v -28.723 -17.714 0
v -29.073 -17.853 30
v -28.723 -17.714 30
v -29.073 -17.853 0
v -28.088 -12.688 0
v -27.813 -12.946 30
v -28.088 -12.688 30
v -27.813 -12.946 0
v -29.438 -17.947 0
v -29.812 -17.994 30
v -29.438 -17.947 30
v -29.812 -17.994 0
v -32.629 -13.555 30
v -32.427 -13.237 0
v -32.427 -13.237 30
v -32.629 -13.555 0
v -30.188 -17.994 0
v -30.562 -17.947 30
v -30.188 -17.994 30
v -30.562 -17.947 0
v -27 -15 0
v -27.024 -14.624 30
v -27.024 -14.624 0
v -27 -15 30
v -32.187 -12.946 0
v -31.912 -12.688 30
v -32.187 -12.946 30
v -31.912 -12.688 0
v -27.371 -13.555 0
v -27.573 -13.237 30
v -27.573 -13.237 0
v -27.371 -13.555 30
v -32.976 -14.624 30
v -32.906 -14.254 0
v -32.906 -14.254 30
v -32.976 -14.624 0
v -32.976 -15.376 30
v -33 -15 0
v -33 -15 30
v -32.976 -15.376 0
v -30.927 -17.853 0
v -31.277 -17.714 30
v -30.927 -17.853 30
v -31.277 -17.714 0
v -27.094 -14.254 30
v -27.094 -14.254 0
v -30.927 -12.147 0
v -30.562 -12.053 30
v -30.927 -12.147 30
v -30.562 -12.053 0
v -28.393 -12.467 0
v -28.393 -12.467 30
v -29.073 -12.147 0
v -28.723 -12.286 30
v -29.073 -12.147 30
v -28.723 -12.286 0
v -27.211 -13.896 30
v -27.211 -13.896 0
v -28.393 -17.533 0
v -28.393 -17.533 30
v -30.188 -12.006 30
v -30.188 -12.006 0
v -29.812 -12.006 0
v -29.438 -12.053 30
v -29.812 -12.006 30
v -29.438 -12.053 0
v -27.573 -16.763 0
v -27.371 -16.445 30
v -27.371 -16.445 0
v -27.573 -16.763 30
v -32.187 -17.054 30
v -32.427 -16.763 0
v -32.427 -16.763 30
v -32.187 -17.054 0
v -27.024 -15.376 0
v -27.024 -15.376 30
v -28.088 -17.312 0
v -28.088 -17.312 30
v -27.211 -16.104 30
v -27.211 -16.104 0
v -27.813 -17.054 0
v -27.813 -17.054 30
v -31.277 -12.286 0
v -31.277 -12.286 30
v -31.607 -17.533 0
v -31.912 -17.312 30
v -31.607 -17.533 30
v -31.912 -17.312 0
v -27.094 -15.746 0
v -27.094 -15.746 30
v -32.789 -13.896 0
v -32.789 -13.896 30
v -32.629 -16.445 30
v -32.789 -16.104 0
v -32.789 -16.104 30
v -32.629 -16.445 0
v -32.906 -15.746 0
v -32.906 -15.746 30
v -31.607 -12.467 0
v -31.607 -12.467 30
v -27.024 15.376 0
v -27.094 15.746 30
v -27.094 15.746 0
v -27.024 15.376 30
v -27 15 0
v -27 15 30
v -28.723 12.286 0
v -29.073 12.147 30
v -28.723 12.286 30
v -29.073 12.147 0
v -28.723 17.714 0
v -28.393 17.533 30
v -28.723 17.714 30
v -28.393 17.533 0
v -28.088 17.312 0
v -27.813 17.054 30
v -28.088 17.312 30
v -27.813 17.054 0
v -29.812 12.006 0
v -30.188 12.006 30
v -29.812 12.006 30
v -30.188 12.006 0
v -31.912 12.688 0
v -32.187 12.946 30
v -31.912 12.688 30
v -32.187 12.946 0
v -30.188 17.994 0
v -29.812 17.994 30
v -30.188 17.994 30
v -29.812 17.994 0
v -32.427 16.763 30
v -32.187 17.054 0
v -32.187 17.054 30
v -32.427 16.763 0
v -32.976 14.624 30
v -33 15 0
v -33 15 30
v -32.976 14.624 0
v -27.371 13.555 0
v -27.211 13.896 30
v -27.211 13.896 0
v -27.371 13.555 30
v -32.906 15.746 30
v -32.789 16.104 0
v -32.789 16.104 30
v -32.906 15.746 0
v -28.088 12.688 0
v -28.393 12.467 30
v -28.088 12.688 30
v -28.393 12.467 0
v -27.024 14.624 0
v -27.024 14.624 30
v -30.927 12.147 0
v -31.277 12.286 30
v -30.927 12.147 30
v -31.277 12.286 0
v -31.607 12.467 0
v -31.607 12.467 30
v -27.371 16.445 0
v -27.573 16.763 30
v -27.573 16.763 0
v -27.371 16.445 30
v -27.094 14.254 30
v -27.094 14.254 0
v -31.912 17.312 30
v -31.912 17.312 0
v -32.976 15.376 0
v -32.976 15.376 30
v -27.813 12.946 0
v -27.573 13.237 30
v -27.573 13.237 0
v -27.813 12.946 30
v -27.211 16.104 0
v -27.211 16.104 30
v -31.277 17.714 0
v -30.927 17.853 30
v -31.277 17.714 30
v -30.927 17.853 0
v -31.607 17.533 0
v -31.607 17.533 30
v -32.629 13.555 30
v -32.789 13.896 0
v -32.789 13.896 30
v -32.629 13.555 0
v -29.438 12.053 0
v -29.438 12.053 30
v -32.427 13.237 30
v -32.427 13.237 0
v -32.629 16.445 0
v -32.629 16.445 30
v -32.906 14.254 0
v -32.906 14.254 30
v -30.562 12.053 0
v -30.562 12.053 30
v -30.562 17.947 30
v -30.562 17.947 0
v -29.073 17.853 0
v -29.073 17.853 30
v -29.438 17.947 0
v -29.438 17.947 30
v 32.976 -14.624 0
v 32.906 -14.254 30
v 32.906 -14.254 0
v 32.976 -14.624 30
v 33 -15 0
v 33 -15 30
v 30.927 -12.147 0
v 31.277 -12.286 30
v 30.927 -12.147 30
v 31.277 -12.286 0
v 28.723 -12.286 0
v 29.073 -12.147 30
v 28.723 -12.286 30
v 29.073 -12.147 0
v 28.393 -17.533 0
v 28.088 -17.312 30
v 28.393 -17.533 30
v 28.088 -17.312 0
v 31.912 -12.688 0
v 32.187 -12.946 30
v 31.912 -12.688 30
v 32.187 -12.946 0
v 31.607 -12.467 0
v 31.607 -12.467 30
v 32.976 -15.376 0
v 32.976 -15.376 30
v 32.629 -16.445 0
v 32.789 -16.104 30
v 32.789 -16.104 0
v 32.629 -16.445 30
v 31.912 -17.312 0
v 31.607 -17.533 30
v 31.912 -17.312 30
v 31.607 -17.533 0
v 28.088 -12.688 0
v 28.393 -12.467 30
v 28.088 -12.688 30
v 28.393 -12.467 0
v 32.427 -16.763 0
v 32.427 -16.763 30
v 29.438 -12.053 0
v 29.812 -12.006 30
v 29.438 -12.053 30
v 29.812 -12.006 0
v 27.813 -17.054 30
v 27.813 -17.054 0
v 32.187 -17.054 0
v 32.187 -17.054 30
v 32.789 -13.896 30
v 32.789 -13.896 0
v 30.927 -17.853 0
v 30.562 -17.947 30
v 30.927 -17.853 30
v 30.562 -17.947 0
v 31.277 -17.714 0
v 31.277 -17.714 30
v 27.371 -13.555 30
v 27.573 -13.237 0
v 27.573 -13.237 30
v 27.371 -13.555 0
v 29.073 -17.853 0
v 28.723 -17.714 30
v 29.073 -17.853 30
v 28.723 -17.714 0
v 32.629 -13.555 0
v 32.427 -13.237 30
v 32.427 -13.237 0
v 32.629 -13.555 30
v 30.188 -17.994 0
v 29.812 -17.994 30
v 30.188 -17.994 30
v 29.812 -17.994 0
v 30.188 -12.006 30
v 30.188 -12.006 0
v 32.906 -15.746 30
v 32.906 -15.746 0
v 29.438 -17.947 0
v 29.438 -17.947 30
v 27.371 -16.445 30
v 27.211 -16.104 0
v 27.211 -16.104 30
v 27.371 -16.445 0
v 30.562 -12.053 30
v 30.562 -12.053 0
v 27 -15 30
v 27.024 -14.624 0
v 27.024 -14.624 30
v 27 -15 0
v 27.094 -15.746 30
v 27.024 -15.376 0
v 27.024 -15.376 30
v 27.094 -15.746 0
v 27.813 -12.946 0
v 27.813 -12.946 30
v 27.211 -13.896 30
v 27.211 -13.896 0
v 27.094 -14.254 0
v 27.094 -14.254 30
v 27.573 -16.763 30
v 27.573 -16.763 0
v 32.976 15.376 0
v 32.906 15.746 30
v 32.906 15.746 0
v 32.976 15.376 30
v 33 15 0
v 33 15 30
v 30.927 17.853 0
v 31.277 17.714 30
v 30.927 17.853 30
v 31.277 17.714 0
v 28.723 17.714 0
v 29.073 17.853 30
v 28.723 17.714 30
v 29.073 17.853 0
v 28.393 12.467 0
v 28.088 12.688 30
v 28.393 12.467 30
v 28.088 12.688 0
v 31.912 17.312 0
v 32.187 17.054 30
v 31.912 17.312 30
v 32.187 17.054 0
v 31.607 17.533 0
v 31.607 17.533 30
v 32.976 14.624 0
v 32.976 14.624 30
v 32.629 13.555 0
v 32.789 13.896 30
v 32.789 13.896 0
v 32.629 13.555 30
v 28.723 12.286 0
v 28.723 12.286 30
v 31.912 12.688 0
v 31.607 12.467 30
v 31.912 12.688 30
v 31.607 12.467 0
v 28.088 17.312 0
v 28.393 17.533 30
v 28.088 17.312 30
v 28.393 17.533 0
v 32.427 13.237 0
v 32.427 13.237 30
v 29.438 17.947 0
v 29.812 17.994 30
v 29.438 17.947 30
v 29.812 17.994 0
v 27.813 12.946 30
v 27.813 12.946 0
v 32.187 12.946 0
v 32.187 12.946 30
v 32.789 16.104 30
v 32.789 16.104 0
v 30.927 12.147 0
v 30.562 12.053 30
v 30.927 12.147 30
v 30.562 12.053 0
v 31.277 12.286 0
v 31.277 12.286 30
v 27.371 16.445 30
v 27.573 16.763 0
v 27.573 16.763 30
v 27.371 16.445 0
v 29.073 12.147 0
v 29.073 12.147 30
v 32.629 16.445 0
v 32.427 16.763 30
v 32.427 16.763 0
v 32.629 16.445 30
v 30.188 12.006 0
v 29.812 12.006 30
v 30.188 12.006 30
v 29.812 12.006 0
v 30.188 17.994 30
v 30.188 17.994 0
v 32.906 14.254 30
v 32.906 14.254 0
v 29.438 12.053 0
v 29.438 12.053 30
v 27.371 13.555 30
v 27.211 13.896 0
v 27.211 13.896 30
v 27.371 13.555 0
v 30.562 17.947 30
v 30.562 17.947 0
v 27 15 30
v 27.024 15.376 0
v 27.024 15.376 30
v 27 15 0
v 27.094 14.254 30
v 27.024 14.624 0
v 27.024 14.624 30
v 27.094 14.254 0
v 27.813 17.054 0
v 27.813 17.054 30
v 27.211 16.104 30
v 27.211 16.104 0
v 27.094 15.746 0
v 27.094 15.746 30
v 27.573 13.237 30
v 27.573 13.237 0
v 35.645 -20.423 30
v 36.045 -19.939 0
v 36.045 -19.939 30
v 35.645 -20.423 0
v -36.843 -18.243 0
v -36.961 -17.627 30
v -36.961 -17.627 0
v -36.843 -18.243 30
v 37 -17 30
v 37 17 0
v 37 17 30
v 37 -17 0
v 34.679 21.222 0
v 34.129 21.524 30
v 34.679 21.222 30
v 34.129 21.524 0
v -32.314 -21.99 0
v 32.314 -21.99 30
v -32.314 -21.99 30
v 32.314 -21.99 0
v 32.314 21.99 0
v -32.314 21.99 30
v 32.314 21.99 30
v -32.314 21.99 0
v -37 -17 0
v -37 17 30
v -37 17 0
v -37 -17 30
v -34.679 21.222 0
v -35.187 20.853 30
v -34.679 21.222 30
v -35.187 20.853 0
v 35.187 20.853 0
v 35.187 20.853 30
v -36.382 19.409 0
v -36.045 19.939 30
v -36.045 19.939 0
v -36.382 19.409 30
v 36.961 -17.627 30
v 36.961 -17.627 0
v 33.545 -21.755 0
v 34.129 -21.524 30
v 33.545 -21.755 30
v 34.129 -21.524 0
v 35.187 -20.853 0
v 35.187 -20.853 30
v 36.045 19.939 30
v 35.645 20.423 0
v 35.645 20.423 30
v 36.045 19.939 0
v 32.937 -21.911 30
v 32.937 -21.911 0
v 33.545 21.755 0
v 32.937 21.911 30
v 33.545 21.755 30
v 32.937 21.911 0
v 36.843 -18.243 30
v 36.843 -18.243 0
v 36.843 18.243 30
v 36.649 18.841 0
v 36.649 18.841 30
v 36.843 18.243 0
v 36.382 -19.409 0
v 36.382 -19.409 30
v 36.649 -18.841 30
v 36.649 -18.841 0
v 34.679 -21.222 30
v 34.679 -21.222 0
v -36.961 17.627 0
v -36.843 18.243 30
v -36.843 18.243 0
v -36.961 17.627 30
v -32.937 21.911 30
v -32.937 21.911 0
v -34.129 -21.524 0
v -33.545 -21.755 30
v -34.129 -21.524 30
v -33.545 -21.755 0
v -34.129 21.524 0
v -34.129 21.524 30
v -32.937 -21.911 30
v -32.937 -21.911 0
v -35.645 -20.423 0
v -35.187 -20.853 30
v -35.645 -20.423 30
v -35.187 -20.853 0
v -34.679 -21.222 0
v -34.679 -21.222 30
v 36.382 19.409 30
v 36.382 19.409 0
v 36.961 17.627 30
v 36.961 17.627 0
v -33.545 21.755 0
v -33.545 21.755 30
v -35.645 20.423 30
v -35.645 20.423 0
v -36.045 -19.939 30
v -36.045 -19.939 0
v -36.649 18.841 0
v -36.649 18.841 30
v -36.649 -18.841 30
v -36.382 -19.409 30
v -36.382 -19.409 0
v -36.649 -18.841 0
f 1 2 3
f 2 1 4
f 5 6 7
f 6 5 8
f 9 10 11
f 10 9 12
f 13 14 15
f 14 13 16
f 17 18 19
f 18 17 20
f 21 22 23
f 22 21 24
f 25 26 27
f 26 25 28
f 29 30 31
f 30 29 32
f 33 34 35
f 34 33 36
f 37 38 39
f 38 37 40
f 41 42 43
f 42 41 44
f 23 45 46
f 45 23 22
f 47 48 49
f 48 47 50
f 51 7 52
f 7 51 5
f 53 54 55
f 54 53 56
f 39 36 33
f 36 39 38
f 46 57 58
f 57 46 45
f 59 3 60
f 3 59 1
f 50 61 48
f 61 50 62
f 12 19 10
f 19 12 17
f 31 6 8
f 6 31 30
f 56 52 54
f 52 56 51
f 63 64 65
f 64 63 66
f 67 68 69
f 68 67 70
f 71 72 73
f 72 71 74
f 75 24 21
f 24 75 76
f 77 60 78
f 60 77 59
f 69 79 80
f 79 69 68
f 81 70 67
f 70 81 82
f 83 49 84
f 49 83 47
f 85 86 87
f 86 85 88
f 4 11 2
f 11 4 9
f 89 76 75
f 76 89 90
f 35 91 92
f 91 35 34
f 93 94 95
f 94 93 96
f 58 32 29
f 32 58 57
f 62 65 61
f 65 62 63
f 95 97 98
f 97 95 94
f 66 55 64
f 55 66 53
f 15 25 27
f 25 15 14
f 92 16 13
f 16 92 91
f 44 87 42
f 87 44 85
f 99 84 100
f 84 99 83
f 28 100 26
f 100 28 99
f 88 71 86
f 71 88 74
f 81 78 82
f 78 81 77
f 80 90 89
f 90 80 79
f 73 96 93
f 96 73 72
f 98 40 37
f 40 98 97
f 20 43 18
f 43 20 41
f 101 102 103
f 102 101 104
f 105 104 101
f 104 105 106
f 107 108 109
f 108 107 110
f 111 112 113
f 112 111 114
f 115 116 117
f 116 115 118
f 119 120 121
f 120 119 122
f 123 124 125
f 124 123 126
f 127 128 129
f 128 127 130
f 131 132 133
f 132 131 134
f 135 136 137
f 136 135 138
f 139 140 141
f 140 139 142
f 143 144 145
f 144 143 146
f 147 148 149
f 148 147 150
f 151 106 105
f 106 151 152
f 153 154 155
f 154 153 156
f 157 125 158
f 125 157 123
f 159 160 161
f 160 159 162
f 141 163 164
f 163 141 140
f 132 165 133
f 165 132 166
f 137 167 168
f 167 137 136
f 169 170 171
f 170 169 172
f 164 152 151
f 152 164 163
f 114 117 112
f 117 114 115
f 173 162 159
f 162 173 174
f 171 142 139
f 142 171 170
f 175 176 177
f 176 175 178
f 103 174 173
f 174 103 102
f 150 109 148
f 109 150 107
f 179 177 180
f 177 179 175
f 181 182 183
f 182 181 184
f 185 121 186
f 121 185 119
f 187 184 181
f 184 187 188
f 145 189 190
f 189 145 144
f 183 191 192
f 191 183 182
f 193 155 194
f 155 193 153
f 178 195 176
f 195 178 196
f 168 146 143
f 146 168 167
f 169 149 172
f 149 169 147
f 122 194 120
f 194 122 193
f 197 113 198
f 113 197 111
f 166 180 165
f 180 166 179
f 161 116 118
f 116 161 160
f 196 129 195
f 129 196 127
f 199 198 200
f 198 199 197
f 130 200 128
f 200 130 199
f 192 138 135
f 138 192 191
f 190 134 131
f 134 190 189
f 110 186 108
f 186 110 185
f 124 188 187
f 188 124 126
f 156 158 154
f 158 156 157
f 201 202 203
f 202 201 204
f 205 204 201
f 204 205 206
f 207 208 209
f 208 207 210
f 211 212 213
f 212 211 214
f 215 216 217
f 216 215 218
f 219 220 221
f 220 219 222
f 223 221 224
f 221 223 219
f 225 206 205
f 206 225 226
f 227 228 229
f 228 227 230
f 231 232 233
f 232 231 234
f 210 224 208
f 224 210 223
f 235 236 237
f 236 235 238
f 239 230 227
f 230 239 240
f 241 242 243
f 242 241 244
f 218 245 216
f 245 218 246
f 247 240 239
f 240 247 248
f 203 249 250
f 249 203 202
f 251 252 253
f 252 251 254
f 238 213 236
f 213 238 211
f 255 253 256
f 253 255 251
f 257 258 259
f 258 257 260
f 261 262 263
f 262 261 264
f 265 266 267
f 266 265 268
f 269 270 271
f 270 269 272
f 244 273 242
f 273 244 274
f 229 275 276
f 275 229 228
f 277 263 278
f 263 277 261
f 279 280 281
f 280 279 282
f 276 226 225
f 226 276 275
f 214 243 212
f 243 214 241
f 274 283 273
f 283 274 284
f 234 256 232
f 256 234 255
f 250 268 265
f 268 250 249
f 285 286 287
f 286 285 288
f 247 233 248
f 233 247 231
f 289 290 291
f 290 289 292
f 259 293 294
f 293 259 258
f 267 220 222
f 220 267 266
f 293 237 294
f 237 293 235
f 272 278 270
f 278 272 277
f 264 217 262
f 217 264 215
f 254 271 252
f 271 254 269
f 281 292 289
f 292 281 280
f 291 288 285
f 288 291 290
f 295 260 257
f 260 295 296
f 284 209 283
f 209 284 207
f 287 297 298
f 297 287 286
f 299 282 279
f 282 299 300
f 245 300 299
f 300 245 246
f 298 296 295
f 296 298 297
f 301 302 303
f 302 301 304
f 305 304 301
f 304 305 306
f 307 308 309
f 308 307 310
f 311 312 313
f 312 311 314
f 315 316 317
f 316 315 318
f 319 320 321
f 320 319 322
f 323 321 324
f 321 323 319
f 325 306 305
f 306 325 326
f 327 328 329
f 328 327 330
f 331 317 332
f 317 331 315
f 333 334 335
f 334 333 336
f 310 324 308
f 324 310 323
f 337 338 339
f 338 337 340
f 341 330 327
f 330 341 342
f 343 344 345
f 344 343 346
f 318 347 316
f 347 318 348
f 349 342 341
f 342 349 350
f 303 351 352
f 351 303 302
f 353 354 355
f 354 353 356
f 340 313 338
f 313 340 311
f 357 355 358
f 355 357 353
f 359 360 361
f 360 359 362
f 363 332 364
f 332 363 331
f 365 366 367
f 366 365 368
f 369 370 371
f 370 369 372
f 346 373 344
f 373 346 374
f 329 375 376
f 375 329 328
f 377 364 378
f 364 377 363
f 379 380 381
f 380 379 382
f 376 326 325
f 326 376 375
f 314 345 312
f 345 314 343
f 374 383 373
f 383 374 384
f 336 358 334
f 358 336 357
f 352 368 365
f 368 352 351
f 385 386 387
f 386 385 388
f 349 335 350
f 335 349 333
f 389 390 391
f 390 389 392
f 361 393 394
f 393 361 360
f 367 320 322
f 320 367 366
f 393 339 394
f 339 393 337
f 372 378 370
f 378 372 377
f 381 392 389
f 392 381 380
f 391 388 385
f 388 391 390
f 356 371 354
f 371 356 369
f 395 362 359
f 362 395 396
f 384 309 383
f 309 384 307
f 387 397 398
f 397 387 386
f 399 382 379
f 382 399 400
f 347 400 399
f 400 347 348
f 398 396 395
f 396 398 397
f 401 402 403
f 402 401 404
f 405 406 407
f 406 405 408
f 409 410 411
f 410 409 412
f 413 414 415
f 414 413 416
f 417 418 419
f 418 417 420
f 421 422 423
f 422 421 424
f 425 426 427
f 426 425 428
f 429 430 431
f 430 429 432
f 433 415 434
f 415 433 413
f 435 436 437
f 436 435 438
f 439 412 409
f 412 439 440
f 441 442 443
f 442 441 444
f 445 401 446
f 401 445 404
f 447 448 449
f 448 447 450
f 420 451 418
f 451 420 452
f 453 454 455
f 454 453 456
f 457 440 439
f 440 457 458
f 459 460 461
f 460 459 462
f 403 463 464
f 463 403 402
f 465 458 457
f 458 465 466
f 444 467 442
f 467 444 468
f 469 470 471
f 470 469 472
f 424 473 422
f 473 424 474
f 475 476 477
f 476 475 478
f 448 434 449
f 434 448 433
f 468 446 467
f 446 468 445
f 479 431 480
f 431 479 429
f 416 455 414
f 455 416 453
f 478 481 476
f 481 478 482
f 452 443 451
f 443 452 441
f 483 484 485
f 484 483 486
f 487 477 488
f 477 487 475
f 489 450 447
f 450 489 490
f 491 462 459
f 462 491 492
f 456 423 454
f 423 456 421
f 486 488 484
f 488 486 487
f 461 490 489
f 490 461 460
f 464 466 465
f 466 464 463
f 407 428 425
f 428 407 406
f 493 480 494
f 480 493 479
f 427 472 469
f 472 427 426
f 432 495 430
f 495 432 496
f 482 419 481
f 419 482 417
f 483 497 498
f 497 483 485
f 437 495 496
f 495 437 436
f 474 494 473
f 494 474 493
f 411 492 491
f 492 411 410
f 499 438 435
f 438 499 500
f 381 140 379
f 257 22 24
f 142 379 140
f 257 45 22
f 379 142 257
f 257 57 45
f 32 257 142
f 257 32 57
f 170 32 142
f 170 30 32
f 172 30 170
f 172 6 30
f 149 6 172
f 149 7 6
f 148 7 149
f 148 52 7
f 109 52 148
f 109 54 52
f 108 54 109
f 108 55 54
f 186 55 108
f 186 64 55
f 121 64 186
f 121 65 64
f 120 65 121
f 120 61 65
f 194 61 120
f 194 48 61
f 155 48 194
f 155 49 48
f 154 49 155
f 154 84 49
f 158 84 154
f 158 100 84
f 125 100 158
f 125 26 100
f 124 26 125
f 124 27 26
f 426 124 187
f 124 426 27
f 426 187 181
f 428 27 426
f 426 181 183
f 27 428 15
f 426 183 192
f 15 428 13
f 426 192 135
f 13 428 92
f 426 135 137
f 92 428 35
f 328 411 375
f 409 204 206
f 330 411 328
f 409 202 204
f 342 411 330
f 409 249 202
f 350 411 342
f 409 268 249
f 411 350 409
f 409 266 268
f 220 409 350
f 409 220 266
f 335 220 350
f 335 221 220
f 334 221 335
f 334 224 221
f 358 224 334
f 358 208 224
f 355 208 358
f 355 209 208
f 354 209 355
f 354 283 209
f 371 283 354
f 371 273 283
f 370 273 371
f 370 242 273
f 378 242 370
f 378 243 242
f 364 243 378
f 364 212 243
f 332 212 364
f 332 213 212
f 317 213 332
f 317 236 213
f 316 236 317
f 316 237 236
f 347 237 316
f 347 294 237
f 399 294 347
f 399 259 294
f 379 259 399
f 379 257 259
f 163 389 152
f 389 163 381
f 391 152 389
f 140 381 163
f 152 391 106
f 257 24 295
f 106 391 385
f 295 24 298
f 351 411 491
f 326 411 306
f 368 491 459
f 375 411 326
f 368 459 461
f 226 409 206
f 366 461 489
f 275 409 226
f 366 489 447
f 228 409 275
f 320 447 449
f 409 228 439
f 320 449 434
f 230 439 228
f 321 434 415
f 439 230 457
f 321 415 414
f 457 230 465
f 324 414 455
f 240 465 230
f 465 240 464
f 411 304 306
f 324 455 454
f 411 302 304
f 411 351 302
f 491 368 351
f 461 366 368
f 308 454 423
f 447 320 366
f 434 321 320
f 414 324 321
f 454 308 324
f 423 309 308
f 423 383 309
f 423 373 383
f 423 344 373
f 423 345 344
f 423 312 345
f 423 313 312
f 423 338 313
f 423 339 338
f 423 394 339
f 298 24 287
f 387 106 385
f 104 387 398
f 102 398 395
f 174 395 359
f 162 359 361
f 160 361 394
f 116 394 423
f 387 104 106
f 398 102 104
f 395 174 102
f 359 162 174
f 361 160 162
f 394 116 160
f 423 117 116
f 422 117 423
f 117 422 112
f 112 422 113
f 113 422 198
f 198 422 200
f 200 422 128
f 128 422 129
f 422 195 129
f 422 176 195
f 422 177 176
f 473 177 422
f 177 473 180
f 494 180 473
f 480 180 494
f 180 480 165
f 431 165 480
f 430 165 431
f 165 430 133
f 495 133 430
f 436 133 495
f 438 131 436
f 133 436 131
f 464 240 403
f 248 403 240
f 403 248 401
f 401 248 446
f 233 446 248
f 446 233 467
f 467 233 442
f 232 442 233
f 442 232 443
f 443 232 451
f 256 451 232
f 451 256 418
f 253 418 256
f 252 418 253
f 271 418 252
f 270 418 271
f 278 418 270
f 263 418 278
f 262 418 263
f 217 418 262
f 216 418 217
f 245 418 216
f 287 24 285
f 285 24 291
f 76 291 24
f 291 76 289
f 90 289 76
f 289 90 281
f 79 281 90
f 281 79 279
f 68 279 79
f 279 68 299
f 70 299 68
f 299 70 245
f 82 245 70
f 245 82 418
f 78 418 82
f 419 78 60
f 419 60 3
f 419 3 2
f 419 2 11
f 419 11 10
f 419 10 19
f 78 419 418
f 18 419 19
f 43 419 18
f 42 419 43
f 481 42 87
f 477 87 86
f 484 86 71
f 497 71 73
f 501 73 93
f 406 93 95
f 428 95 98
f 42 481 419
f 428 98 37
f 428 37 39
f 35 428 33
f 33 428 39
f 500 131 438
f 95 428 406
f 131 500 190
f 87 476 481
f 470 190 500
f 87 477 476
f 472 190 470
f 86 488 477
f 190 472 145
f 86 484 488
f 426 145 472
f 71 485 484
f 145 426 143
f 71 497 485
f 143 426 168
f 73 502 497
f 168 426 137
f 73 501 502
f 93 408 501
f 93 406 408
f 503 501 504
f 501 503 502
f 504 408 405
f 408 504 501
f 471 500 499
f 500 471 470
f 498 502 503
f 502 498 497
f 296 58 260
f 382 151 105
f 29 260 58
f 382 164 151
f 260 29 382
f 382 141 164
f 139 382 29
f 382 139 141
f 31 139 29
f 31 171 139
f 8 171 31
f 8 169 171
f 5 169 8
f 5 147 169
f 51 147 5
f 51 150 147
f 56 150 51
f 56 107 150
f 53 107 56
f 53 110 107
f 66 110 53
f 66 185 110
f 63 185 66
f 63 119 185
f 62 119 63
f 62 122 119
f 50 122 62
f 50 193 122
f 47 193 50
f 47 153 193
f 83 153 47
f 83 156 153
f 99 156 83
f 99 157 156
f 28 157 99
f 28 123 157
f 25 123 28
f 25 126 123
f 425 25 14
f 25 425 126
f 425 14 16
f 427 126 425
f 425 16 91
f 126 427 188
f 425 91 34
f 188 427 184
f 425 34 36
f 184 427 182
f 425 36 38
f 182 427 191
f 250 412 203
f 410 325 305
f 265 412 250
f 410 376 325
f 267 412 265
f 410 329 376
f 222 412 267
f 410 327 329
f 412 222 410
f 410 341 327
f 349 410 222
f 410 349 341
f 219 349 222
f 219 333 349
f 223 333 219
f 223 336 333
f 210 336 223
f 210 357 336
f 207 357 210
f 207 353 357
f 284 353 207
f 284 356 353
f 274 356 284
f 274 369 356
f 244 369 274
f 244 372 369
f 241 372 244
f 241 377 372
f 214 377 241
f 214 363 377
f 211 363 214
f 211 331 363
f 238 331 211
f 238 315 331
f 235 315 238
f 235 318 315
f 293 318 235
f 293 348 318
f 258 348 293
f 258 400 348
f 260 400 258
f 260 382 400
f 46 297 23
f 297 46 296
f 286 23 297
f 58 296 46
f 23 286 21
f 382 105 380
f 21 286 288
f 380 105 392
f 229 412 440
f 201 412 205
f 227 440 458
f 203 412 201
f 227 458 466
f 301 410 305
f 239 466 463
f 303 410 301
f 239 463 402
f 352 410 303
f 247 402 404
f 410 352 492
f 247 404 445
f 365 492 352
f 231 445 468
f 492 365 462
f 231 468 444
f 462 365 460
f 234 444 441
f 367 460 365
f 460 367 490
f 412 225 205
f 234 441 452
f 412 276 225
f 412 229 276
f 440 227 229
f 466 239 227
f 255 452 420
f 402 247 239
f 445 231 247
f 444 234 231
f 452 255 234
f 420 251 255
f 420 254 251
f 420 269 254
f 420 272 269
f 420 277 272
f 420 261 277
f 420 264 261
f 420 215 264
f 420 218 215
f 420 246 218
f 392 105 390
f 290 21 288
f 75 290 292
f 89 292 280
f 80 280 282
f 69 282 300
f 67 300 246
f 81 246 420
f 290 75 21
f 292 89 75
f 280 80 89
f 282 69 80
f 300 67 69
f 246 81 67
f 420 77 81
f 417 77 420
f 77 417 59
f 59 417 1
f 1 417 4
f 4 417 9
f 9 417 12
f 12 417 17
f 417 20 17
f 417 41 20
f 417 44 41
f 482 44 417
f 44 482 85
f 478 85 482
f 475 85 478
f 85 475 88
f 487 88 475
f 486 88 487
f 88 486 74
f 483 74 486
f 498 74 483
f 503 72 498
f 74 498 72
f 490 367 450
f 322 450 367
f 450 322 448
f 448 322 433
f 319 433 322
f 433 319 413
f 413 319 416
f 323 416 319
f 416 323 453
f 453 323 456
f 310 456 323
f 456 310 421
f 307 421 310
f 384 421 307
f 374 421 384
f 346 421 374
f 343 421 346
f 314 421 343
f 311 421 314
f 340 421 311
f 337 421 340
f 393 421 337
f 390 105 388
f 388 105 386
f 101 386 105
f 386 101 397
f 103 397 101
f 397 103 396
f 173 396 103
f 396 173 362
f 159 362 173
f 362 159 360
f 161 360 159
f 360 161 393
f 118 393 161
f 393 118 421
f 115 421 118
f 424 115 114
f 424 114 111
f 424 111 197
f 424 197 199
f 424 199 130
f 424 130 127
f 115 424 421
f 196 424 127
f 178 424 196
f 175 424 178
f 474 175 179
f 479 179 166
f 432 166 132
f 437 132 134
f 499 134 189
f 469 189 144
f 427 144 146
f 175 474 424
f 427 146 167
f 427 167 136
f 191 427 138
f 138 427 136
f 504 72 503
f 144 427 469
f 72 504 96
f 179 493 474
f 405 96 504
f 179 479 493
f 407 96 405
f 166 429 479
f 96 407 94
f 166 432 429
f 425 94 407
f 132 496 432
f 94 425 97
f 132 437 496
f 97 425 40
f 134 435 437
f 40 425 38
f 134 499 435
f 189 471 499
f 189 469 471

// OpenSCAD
$fn = 50;


difference() {
	union() {
		hull() {
			translate(v = [-32.0000000000, 17.0000000000, 0]) {
				cylinder(h = 30, r = 5);
			}
			translate(v = [32.0000000000, 17.0000000000, 0]) {
				cylinder(h = 30, r = 5);
			}
			translate(v = [-32.0000000000, -17.0000000000, 0]) {
				cylinder(h = 30, r = 5);
			}
			translate(v = [32.0000000000, -17.0000000000, 0]) {
				cylinder(h = 30, r = 5);
			}
		}
	}
	union() {
		translate(v = [-30.0000000000, -15.0000000000, -100.0000000000]) {
			cylinder(h = 200, r = 3.0000000000);
		}
		translate(v = [-30.0000000000, 15.0000000000, -100.0000000000]) {
			cylinder(h = 200, r = 3.0000000000);
		}
		translate(v = [30.0000000000, -15.0000000000, -100.0000000000]) {
			cylinder(h = 200, r = 3.0000000000);
		}
		translate(v = [30.0000000000, 15.0000000000, -100.0000000000]) {
			cylinder(h = 200, r = 3.0000000000);
		}
	}
}
